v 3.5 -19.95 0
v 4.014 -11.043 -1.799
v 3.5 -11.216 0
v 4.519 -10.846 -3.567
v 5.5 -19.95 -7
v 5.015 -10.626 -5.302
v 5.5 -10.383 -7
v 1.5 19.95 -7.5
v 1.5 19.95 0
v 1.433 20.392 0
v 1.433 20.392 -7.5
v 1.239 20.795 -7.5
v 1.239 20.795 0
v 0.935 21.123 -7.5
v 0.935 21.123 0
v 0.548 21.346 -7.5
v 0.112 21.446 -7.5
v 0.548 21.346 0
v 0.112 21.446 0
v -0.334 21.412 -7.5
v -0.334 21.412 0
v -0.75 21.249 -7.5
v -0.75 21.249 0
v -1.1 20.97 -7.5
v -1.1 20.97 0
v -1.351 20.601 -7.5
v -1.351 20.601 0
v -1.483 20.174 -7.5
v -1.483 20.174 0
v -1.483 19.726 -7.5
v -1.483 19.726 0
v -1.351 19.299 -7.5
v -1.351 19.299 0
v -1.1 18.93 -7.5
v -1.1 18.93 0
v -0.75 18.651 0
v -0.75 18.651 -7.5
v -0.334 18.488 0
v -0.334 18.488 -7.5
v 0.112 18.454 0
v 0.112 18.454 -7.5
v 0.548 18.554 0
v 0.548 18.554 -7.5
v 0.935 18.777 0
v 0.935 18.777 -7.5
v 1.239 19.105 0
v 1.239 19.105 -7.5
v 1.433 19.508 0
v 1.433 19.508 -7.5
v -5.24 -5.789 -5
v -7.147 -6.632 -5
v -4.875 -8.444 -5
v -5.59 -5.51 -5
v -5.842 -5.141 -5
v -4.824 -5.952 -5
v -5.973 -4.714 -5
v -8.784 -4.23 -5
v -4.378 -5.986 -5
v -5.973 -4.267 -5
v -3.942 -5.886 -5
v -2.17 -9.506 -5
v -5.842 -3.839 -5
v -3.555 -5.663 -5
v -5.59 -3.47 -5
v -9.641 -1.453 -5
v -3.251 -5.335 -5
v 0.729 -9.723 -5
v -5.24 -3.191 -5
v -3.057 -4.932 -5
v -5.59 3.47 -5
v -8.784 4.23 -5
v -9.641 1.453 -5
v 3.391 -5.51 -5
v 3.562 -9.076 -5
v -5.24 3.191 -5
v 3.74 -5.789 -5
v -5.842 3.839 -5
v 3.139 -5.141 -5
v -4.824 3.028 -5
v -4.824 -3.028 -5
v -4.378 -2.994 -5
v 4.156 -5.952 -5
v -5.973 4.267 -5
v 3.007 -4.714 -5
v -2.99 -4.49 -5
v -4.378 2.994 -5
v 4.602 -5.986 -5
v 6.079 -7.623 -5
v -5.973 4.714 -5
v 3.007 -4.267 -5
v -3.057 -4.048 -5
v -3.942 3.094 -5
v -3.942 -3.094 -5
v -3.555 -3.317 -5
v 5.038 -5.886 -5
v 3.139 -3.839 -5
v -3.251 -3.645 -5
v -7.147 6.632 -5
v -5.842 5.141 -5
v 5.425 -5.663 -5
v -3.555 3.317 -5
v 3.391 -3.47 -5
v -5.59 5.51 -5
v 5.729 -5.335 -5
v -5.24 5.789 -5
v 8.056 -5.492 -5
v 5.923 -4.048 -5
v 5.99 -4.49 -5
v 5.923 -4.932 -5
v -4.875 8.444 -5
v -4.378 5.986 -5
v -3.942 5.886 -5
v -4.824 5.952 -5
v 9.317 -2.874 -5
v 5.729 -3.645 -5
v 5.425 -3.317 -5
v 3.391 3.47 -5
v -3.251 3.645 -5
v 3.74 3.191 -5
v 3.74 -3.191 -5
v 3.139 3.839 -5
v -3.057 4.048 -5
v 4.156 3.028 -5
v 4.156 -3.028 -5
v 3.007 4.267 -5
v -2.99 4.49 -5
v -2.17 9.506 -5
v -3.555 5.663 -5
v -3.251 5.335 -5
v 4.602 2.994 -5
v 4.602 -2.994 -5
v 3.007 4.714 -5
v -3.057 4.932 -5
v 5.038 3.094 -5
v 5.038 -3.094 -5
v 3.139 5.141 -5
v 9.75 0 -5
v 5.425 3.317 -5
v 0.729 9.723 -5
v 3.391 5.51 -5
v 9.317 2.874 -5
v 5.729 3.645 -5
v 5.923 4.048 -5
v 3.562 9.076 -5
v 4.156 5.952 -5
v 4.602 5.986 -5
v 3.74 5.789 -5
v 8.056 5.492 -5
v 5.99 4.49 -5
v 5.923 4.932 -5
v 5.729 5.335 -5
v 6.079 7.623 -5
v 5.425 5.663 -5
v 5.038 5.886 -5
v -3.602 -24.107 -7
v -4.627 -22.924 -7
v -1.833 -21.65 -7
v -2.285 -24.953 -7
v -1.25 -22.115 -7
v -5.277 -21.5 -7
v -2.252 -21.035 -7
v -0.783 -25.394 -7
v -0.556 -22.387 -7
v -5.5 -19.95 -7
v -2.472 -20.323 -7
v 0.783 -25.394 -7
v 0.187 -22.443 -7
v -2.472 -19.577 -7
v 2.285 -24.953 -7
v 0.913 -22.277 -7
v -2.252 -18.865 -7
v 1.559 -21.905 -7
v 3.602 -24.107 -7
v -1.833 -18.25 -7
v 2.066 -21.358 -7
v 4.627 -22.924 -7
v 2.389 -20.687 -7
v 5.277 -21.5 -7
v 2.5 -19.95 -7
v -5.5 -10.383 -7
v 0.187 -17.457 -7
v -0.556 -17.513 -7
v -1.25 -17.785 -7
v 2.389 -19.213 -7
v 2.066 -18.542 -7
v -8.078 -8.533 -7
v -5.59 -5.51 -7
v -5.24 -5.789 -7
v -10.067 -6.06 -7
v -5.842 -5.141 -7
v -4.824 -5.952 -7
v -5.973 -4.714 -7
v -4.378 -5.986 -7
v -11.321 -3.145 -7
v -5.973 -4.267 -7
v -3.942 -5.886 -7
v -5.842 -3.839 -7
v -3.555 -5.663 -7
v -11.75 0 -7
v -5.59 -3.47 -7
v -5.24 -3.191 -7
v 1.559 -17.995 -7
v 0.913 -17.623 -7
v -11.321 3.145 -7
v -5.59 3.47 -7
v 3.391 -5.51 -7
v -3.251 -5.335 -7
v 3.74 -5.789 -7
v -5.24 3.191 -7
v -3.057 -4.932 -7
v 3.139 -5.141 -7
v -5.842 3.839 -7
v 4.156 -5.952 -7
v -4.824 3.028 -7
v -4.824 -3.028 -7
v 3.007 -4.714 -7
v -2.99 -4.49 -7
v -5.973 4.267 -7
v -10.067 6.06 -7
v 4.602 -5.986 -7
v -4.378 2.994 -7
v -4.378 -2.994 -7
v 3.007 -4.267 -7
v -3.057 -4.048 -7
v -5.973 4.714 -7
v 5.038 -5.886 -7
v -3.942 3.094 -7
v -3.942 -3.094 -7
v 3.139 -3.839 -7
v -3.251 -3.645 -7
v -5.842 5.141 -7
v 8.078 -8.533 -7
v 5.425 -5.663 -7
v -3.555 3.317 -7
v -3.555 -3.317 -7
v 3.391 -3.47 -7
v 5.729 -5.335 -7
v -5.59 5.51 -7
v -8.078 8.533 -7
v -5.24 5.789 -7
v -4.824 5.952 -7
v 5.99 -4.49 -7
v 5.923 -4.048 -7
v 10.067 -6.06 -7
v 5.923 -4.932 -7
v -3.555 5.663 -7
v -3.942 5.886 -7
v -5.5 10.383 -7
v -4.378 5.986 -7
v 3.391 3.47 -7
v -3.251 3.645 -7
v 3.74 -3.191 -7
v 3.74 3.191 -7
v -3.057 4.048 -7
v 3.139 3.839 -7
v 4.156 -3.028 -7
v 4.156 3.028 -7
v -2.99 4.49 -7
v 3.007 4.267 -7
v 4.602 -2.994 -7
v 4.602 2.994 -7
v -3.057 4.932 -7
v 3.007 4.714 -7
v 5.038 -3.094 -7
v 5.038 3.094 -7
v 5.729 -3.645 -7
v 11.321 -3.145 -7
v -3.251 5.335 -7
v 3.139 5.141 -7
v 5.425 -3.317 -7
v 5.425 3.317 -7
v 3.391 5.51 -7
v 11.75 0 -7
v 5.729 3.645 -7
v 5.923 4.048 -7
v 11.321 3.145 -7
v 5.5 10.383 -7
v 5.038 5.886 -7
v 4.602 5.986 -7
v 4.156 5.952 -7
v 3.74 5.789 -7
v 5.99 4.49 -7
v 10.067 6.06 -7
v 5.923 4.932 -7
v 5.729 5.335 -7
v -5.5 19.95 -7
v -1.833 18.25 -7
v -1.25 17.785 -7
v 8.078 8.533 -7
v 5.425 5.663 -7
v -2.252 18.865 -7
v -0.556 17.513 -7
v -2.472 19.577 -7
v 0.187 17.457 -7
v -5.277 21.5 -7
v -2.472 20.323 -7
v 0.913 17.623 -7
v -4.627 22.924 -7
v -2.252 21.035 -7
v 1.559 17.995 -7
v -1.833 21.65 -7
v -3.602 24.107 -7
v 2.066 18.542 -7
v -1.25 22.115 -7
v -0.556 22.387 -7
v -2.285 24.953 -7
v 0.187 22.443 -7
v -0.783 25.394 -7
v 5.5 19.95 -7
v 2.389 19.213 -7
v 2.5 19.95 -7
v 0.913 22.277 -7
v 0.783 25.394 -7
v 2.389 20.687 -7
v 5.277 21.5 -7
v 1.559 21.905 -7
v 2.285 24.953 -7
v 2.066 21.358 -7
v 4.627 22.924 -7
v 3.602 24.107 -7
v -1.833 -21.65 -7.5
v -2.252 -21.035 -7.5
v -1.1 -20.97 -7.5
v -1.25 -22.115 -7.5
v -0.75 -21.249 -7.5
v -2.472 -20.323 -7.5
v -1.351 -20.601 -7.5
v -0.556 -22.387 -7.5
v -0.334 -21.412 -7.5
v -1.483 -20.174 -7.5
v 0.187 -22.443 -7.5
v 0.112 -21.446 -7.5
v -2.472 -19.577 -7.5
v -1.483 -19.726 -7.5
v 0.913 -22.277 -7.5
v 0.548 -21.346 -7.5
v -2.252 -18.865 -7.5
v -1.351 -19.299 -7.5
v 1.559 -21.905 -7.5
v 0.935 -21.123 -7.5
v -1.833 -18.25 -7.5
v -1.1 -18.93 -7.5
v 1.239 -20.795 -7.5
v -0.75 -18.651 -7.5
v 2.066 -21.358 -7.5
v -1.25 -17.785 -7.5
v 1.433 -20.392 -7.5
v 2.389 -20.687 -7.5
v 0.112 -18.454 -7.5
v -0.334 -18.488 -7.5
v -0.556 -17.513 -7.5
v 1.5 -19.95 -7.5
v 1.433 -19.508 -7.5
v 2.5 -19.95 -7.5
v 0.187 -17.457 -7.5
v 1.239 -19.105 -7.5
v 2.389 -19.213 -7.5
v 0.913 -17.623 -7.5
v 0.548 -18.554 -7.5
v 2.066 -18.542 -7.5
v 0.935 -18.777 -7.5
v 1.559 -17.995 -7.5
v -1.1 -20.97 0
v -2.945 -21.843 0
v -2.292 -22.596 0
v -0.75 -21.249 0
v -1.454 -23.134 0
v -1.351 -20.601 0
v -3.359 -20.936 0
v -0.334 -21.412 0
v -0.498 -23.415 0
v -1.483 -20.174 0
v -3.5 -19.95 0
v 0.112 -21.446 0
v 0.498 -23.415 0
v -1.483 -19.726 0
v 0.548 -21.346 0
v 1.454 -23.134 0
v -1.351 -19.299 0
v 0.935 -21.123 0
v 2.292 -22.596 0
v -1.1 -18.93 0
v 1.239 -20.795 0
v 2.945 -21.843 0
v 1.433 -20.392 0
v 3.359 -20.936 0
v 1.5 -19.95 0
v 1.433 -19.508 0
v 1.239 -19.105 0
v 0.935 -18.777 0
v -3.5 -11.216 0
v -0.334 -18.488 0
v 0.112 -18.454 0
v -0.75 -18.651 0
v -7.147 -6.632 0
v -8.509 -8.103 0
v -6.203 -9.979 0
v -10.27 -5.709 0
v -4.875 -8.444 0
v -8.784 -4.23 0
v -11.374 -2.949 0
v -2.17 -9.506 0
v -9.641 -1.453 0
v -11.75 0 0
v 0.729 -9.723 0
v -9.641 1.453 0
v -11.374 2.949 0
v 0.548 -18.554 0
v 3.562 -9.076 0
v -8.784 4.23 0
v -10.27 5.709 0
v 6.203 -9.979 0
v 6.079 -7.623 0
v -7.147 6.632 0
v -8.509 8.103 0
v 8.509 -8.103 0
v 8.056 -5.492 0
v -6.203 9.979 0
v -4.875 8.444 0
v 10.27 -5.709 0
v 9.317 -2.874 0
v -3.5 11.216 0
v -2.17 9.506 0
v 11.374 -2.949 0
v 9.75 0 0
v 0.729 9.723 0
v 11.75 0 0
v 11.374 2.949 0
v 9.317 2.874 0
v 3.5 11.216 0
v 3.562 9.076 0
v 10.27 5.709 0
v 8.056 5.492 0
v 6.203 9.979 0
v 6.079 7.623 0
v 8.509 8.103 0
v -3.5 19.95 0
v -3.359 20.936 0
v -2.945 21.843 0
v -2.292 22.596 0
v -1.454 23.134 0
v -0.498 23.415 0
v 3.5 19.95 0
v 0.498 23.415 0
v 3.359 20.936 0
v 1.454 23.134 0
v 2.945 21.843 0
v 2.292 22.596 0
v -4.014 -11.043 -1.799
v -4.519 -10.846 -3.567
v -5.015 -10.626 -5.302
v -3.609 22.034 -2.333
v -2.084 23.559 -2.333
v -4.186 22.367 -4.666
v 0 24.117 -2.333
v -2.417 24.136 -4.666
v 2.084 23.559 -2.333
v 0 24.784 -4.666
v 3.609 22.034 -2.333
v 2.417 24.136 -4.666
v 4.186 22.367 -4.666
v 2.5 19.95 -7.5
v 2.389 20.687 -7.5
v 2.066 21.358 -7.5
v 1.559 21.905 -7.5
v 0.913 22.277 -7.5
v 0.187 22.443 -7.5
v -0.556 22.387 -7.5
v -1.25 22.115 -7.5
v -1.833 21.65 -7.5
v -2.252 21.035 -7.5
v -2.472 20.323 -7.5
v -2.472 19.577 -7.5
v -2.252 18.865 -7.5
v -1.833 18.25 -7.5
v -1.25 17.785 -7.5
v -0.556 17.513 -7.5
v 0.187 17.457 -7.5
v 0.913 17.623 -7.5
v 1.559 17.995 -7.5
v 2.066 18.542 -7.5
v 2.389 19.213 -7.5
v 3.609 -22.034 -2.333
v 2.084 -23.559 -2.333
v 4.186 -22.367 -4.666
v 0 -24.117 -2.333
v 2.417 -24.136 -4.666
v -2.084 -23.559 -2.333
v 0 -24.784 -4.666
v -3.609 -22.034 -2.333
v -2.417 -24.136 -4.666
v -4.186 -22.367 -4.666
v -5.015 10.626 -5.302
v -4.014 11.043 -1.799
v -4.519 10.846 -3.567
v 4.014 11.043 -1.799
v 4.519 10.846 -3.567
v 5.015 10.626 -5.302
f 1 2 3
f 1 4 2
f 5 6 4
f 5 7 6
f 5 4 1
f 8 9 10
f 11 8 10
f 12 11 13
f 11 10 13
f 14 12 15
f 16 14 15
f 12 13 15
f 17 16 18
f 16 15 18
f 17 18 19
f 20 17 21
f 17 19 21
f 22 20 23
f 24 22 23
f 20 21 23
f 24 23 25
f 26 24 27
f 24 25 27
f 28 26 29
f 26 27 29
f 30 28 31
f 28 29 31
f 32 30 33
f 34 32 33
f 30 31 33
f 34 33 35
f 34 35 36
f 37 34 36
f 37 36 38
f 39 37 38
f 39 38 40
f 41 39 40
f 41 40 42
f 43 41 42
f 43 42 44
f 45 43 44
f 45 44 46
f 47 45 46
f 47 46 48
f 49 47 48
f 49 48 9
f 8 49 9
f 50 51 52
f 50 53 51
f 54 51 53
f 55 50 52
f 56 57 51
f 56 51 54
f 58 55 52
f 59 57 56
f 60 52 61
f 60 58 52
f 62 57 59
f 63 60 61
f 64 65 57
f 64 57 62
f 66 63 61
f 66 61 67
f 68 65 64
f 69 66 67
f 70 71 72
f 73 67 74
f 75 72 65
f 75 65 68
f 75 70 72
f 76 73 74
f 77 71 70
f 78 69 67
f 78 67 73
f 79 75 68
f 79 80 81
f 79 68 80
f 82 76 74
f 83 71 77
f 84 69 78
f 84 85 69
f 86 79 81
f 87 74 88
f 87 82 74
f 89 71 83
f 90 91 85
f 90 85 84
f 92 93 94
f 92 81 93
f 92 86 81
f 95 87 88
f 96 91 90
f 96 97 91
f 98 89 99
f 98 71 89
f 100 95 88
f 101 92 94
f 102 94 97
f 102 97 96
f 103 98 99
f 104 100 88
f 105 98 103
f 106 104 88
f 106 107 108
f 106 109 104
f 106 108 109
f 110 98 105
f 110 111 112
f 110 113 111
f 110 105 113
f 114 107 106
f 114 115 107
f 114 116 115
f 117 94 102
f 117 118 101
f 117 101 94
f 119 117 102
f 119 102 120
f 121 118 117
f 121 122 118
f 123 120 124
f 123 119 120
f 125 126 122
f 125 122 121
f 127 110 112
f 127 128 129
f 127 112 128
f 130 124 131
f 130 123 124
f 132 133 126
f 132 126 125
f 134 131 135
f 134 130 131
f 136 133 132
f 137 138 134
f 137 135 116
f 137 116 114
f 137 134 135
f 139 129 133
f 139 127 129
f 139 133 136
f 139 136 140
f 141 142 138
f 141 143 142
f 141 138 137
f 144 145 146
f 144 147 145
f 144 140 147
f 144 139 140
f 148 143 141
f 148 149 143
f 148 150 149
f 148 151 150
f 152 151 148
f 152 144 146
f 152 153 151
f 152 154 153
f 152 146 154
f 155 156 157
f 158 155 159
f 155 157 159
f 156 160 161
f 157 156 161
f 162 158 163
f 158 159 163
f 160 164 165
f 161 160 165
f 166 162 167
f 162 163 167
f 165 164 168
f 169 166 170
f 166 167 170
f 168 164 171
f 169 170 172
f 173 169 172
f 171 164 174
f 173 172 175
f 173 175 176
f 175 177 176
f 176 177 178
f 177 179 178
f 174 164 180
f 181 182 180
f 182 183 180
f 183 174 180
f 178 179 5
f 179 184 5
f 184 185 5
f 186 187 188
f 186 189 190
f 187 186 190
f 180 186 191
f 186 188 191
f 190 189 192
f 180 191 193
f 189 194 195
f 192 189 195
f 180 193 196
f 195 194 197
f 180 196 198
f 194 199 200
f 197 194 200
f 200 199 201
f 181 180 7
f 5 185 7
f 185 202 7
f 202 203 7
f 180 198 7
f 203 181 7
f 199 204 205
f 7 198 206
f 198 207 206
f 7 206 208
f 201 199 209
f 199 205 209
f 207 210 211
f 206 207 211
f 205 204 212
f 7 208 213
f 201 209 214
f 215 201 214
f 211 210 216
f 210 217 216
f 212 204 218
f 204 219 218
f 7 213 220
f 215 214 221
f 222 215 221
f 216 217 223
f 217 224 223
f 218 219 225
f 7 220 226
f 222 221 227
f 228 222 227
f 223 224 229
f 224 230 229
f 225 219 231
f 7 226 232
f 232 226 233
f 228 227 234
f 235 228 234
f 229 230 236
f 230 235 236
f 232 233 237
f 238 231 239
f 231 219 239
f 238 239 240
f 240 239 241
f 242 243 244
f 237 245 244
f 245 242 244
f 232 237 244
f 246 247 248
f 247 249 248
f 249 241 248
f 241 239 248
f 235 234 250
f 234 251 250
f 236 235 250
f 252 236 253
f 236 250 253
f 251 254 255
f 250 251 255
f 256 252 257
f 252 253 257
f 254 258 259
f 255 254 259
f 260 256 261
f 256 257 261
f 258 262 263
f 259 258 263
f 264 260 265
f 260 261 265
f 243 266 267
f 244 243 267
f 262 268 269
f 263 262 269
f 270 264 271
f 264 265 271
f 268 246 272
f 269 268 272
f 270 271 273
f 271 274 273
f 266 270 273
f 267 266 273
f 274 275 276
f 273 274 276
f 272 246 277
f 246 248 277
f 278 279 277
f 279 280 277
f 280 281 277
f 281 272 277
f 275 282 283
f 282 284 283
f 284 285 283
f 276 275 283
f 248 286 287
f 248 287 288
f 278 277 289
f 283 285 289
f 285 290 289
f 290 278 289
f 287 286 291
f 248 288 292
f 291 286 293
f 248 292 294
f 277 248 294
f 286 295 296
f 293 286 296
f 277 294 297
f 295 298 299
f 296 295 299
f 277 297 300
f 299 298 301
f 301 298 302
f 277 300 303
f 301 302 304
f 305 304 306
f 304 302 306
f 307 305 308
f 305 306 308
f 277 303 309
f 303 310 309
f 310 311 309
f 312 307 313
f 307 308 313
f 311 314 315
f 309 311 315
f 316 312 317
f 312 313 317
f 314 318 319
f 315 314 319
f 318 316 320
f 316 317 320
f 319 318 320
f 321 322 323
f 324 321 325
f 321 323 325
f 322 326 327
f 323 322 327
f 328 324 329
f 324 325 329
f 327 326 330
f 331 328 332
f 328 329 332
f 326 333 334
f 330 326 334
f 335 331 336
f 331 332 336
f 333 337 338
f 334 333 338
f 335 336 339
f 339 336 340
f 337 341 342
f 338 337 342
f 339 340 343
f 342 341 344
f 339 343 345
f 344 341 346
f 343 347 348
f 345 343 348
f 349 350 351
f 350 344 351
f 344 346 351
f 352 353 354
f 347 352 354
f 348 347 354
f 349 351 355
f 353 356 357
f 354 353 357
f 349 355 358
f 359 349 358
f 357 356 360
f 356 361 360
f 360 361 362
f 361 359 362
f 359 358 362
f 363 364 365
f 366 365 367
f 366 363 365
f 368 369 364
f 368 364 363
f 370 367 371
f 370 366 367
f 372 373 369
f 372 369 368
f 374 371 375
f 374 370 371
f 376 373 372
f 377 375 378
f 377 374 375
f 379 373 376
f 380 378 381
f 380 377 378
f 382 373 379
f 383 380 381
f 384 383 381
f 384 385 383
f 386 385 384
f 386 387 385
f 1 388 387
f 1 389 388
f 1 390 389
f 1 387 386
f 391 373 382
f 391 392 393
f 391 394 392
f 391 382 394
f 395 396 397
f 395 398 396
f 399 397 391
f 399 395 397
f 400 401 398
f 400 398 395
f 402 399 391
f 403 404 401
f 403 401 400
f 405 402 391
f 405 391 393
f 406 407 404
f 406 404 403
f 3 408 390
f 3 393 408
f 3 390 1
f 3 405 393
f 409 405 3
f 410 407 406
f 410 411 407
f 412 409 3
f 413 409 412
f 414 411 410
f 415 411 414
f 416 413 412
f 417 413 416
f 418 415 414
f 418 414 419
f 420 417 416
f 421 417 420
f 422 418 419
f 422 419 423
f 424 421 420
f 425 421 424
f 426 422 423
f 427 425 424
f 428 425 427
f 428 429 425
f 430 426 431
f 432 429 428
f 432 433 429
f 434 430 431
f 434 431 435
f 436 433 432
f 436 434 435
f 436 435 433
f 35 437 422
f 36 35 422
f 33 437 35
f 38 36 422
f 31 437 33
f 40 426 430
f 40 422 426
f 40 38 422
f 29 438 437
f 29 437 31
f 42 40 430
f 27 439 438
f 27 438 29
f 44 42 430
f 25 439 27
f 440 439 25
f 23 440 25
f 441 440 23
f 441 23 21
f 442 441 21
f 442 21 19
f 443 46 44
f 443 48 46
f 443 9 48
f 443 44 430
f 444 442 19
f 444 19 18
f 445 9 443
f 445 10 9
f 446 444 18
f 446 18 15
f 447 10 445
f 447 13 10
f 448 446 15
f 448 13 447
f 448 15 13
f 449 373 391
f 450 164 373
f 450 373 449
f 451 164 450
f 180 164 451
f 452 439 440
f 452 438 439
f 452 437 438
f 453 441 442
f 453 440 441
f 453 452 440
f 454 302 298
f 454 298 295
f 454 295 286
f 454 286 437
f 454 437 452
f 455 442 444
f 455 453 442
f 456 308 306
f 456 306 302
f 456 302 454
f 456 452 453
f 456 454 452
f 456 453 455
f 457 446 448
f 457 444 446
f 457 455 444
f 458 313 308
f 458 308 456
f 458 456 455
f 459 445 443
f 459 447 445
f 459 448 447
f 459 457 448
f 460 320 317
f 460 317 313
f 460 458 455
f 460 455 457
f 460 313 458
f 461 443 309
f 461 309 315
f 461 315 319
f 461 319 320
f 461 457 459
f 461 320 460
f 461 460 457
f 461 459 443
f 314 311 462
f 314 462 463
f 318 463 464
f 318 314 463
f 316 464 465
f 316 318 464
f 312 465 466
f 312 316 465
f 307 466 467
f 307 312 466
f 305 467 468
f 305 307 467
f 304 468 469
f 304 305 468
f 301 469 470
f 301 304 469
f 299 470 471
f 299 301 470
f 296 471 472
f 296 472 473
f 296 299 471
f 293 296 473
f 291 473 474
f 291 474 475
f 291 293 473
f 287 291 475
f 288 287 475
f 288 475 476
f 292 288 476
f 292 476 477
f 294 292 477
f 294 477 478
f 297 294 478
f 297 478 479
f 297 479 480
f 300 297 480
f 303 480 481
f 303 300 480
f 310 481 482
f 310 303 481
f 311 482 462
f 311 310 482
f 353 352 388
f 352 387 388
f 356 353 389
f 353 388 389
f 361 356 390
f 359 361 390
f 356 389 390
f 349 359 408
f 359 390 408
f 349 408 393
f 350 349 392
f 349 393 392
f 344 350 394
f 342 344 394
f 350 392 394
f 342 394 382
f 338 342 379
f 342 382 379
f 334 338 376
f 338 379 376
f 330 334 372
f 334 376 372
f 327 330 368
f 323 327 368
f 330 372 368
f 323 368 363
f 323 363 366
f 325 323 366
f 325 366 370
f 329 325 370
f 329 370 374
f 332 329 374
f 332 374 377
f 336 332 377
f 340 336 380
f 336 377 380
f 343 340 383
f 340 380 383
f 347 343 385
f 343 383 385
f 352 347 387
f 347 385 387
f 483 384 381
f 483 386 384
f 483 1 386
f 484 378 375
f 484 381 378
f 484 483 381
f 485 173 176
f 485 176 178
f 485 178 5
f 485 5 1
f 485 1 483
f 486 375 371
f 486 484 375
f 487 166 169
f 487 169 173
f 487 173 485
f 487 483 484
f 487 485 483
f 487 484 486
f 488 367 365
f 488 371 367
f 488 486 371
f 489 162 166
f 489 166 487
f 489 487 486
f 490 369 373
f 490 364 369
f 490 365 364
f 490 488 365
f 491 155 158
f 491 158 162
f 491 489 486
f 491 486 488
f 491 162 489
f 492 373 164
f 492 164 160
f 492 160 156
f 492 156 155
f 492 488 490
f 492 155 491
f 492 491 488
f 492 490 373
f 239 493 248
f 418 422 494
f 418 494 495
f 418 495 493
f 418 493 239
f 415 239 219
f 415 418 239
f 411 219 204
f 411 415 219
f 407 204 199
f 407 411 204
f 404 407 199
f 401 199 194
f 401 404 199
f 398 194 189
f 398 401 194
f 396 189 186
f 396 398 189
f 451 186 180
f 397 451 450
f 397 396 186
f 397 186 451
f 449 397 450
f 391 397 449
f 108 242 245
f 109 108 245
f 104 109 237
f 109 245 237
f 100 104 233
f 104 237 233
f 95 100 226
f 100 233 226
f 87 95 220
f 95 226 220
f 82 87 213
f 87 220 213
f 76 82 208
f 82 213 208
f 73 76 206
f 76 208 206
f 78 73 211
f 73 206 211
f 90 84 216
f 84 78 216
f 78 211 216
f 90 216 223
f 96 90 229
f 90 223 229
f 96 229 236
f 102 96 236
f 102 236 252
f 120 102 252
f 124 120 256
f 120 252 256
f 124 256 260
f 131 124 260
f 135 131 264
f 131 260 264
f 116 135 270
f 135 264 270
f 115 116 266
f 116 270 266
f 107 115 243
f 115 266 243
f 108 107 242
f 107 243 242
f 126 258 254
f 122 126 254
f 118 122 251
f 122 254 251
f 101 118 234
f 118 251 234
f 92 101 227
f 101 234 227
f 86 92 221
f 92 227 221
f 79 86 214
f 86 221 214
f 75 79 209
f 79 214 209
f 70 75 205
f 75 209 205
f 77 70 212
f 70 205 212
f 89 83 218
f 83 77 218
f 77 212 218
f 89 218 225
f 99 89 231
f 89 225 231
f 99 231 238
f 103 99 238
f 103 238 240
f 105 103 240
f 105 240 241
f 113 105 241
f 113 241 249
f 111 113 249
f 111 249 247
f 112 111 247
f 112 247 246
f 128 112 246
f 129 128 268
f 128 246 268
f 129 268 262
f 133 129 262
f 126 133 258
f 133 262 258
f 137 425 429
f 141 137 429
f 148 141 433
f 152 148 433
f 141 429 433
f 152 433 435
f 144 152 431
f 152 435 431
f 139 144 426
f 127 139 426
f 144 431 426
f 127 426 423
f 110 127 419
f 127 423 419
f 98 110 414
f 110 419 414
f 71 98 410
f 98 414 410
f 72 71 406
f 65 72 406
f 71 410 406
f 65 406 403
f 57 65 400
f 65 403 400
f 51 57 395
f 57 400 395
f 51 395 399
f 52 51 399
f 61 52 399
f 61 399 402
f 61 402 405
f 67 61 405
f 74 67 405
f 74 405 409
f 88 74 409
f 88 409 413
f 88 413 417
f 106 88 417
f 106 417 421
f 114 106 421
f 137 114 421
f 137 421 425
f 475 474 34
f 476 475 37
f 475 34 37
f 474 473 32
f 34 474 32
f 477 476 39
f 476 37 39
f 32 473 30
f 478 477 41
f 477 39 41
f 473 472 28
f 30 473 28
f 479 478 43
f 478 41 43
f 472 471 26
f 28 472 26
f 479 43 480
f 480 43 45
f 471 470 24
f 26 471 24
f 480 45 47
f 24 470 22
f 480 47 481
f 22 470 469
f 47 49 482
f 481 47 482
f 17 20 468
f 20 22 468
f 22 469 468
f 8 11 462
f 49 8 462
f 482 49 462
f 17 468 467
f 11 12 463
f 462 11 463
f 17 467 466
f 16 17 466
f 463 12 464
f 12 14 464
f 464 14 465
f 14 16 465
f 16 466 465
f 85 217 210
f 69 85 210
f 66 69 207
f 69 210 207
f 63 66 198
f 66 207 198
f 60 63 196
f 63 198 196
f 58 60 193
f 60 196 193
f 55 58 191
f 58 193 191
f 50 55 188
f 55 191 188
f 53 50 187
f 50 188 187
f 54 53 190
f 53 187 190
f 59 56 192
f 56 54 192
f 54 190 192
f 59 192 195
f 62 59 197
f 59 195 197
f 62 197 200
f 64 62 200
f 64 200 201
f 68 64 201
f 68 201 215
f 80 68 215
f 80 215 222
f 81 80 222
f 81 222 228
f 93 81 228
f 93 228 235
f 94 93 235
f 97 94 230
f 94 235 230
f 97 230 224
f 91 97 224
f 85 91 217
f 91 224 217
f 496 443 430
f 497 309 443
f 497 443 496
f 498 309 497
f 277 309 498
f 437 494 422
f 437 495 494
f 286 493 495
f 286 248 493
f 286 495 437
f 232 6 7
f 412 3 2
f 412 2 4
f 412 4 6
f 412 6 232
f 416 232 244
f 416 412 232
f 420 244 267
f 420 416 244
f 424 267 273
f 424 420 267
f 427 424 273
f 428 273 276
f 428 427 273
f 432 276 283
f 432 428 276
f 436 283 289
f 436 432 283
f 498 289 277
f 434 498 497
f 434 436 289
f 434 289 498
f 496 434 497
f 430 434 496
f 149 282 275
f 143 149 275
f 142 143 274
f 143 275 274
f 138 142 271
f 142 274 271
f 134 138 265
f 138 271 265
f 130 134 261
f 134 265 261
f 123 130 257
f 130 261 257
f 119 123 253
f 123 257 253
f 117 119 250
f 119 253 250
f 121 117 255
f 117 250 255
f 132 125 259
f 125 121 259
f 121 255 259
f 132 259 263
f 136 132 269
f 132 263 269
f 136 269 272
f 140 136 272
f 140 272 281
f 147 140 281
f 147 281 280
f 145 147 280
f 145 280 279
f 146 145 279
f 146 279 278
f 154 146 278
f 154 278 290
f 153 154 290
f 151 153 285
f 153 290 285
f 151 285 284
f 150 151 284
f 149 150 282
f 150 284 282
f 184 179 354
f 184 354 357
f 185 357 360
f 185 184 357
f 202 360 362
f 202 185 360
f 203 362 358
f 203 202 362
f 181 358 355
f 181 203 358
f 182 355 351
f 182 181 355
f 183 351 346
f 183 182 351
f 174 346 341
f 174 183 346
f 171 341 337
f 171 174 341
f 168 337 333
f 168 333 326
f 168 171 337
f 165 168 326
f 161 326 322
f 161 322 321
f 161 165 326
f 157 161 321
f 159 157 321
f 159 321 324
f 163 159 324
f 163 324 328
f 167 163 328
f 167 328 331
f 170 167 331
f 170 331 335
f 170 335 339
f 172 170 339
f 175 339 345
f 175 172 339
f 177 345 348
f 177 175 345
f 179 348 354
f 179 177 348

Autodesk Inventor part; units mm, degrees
ref_plane "YZ Plane" through (0, 0, 0) normal (1, 0, 0) x (0, 1, 0)
ref_plane "XZ Plane" through (0, 0, 0) normal (0, 1, 0) x (-1, 0, 0)
ref_plane "XY Plane" through (0, 0, 0) normal (0, 0, 1) x (1, 0, 0)
sketch "Skizze1" plane through (0, 0, 0) normal (0, 0, 1) x (1, 0, 0)
  line L0 (0, -19.95) -> (0, 19.95) construction
  arc A0 (-5.5, -19.95) -> (5.5, -19.95) centre (0, -19.95) ccw
  arc A1 (5.5, 19.95) -> (-5.5, 19.95) centre (0, 19.95) ccw
  line L1 (0, 37.03) -> (0, -37.03) construction
  line L2 (-16.45, 0) -> (16.45, 0) construction
  circle A2 centre (0, 19.95) radius 1.5
  circle A3 centre (0, -19.95) radius 1.5
  circle A4 centre (0, 19.95) radius 6.5 construction
  circle A5 centre (0, -19.95) radius 6.5 construction
  line L3 (0, 26.45) -> (0, -26.45) construction
  circle A6 centre (0, 19.95) radius 2.5
  circle A7 centre (0, -19.95) radius 2.5
  circle A8 centre (0, 0) radius 9.75
  line L4 (-5.5, 19.95) -> (-5.5, 10.3833)
  line L5 (-5.5, -10.3833) -> (-5.5, -19.95)
  line L6 (5.5, -19.95) -> (5.5, -10.3833)
  line L7 (5.5, 10.3833) -> (5.5, 19.95)
  arc A9 (5.5, -10.3833) -> (5.5, 10.3833) centre (0, 0) ccw
  arc A10 (-5.5, 10.3833) -> (-5.5, -10.3833) centre (0, 0) ccw
  circle A11 centre (0, 0) radius 6.35 construction
  circle A12 centre (-4.4901, 4.4901) radius 1.5
  circle A13 centre (-4.4901, -4.4901) radius 1.5
  circle A14 centre (4.4901, -4.4901) radius 1.5
  circle A15 centre (4.4901, 4.4901) radius 1.5
  line L8 (-4.4901, 4.4901) -> (0, 0) construction
  dimension "d4" = 13
  dimension "d31" = 12.7
  dimension "d1" = 3
  dimension "d5" = 52.9
  dimension "d19" = 1
  dimension "d26" = 19.5
  dimension "d28" = 2
  dimension "d32" = 3
  dimension "d35" = 360
  dimension "d37" = 45
  dimension "d38" = 3
extrude "Extrusion1" add sketch "Skizze1" against normal blind 7 contours L5 A10 L4 A1 L7 A9 L6 A0 | A6 | A7
chamfer "Fase2" distance 2 distance2 7 6 edges at (5.5, -15.1666, 0) (0, -25.45, 0) (-5.5, -15.1666, 0) (0, 25.45, 0) (5.5, 15.1666, 0) (-5.5, 15.1666, 0) measured on face at (-4.0409, -16.4295, 0)
extrude "Extrusion4" add sketch "Skizze1" against normal blind 0.5 from surface at -7 contours A6 | A7
extrude "Extrusion6" add sketch "Skizze1" along normal blind 2 from surface at -7 contours A8
properties part number "HarmonicDrive-WaveGenerator-Bottom"
